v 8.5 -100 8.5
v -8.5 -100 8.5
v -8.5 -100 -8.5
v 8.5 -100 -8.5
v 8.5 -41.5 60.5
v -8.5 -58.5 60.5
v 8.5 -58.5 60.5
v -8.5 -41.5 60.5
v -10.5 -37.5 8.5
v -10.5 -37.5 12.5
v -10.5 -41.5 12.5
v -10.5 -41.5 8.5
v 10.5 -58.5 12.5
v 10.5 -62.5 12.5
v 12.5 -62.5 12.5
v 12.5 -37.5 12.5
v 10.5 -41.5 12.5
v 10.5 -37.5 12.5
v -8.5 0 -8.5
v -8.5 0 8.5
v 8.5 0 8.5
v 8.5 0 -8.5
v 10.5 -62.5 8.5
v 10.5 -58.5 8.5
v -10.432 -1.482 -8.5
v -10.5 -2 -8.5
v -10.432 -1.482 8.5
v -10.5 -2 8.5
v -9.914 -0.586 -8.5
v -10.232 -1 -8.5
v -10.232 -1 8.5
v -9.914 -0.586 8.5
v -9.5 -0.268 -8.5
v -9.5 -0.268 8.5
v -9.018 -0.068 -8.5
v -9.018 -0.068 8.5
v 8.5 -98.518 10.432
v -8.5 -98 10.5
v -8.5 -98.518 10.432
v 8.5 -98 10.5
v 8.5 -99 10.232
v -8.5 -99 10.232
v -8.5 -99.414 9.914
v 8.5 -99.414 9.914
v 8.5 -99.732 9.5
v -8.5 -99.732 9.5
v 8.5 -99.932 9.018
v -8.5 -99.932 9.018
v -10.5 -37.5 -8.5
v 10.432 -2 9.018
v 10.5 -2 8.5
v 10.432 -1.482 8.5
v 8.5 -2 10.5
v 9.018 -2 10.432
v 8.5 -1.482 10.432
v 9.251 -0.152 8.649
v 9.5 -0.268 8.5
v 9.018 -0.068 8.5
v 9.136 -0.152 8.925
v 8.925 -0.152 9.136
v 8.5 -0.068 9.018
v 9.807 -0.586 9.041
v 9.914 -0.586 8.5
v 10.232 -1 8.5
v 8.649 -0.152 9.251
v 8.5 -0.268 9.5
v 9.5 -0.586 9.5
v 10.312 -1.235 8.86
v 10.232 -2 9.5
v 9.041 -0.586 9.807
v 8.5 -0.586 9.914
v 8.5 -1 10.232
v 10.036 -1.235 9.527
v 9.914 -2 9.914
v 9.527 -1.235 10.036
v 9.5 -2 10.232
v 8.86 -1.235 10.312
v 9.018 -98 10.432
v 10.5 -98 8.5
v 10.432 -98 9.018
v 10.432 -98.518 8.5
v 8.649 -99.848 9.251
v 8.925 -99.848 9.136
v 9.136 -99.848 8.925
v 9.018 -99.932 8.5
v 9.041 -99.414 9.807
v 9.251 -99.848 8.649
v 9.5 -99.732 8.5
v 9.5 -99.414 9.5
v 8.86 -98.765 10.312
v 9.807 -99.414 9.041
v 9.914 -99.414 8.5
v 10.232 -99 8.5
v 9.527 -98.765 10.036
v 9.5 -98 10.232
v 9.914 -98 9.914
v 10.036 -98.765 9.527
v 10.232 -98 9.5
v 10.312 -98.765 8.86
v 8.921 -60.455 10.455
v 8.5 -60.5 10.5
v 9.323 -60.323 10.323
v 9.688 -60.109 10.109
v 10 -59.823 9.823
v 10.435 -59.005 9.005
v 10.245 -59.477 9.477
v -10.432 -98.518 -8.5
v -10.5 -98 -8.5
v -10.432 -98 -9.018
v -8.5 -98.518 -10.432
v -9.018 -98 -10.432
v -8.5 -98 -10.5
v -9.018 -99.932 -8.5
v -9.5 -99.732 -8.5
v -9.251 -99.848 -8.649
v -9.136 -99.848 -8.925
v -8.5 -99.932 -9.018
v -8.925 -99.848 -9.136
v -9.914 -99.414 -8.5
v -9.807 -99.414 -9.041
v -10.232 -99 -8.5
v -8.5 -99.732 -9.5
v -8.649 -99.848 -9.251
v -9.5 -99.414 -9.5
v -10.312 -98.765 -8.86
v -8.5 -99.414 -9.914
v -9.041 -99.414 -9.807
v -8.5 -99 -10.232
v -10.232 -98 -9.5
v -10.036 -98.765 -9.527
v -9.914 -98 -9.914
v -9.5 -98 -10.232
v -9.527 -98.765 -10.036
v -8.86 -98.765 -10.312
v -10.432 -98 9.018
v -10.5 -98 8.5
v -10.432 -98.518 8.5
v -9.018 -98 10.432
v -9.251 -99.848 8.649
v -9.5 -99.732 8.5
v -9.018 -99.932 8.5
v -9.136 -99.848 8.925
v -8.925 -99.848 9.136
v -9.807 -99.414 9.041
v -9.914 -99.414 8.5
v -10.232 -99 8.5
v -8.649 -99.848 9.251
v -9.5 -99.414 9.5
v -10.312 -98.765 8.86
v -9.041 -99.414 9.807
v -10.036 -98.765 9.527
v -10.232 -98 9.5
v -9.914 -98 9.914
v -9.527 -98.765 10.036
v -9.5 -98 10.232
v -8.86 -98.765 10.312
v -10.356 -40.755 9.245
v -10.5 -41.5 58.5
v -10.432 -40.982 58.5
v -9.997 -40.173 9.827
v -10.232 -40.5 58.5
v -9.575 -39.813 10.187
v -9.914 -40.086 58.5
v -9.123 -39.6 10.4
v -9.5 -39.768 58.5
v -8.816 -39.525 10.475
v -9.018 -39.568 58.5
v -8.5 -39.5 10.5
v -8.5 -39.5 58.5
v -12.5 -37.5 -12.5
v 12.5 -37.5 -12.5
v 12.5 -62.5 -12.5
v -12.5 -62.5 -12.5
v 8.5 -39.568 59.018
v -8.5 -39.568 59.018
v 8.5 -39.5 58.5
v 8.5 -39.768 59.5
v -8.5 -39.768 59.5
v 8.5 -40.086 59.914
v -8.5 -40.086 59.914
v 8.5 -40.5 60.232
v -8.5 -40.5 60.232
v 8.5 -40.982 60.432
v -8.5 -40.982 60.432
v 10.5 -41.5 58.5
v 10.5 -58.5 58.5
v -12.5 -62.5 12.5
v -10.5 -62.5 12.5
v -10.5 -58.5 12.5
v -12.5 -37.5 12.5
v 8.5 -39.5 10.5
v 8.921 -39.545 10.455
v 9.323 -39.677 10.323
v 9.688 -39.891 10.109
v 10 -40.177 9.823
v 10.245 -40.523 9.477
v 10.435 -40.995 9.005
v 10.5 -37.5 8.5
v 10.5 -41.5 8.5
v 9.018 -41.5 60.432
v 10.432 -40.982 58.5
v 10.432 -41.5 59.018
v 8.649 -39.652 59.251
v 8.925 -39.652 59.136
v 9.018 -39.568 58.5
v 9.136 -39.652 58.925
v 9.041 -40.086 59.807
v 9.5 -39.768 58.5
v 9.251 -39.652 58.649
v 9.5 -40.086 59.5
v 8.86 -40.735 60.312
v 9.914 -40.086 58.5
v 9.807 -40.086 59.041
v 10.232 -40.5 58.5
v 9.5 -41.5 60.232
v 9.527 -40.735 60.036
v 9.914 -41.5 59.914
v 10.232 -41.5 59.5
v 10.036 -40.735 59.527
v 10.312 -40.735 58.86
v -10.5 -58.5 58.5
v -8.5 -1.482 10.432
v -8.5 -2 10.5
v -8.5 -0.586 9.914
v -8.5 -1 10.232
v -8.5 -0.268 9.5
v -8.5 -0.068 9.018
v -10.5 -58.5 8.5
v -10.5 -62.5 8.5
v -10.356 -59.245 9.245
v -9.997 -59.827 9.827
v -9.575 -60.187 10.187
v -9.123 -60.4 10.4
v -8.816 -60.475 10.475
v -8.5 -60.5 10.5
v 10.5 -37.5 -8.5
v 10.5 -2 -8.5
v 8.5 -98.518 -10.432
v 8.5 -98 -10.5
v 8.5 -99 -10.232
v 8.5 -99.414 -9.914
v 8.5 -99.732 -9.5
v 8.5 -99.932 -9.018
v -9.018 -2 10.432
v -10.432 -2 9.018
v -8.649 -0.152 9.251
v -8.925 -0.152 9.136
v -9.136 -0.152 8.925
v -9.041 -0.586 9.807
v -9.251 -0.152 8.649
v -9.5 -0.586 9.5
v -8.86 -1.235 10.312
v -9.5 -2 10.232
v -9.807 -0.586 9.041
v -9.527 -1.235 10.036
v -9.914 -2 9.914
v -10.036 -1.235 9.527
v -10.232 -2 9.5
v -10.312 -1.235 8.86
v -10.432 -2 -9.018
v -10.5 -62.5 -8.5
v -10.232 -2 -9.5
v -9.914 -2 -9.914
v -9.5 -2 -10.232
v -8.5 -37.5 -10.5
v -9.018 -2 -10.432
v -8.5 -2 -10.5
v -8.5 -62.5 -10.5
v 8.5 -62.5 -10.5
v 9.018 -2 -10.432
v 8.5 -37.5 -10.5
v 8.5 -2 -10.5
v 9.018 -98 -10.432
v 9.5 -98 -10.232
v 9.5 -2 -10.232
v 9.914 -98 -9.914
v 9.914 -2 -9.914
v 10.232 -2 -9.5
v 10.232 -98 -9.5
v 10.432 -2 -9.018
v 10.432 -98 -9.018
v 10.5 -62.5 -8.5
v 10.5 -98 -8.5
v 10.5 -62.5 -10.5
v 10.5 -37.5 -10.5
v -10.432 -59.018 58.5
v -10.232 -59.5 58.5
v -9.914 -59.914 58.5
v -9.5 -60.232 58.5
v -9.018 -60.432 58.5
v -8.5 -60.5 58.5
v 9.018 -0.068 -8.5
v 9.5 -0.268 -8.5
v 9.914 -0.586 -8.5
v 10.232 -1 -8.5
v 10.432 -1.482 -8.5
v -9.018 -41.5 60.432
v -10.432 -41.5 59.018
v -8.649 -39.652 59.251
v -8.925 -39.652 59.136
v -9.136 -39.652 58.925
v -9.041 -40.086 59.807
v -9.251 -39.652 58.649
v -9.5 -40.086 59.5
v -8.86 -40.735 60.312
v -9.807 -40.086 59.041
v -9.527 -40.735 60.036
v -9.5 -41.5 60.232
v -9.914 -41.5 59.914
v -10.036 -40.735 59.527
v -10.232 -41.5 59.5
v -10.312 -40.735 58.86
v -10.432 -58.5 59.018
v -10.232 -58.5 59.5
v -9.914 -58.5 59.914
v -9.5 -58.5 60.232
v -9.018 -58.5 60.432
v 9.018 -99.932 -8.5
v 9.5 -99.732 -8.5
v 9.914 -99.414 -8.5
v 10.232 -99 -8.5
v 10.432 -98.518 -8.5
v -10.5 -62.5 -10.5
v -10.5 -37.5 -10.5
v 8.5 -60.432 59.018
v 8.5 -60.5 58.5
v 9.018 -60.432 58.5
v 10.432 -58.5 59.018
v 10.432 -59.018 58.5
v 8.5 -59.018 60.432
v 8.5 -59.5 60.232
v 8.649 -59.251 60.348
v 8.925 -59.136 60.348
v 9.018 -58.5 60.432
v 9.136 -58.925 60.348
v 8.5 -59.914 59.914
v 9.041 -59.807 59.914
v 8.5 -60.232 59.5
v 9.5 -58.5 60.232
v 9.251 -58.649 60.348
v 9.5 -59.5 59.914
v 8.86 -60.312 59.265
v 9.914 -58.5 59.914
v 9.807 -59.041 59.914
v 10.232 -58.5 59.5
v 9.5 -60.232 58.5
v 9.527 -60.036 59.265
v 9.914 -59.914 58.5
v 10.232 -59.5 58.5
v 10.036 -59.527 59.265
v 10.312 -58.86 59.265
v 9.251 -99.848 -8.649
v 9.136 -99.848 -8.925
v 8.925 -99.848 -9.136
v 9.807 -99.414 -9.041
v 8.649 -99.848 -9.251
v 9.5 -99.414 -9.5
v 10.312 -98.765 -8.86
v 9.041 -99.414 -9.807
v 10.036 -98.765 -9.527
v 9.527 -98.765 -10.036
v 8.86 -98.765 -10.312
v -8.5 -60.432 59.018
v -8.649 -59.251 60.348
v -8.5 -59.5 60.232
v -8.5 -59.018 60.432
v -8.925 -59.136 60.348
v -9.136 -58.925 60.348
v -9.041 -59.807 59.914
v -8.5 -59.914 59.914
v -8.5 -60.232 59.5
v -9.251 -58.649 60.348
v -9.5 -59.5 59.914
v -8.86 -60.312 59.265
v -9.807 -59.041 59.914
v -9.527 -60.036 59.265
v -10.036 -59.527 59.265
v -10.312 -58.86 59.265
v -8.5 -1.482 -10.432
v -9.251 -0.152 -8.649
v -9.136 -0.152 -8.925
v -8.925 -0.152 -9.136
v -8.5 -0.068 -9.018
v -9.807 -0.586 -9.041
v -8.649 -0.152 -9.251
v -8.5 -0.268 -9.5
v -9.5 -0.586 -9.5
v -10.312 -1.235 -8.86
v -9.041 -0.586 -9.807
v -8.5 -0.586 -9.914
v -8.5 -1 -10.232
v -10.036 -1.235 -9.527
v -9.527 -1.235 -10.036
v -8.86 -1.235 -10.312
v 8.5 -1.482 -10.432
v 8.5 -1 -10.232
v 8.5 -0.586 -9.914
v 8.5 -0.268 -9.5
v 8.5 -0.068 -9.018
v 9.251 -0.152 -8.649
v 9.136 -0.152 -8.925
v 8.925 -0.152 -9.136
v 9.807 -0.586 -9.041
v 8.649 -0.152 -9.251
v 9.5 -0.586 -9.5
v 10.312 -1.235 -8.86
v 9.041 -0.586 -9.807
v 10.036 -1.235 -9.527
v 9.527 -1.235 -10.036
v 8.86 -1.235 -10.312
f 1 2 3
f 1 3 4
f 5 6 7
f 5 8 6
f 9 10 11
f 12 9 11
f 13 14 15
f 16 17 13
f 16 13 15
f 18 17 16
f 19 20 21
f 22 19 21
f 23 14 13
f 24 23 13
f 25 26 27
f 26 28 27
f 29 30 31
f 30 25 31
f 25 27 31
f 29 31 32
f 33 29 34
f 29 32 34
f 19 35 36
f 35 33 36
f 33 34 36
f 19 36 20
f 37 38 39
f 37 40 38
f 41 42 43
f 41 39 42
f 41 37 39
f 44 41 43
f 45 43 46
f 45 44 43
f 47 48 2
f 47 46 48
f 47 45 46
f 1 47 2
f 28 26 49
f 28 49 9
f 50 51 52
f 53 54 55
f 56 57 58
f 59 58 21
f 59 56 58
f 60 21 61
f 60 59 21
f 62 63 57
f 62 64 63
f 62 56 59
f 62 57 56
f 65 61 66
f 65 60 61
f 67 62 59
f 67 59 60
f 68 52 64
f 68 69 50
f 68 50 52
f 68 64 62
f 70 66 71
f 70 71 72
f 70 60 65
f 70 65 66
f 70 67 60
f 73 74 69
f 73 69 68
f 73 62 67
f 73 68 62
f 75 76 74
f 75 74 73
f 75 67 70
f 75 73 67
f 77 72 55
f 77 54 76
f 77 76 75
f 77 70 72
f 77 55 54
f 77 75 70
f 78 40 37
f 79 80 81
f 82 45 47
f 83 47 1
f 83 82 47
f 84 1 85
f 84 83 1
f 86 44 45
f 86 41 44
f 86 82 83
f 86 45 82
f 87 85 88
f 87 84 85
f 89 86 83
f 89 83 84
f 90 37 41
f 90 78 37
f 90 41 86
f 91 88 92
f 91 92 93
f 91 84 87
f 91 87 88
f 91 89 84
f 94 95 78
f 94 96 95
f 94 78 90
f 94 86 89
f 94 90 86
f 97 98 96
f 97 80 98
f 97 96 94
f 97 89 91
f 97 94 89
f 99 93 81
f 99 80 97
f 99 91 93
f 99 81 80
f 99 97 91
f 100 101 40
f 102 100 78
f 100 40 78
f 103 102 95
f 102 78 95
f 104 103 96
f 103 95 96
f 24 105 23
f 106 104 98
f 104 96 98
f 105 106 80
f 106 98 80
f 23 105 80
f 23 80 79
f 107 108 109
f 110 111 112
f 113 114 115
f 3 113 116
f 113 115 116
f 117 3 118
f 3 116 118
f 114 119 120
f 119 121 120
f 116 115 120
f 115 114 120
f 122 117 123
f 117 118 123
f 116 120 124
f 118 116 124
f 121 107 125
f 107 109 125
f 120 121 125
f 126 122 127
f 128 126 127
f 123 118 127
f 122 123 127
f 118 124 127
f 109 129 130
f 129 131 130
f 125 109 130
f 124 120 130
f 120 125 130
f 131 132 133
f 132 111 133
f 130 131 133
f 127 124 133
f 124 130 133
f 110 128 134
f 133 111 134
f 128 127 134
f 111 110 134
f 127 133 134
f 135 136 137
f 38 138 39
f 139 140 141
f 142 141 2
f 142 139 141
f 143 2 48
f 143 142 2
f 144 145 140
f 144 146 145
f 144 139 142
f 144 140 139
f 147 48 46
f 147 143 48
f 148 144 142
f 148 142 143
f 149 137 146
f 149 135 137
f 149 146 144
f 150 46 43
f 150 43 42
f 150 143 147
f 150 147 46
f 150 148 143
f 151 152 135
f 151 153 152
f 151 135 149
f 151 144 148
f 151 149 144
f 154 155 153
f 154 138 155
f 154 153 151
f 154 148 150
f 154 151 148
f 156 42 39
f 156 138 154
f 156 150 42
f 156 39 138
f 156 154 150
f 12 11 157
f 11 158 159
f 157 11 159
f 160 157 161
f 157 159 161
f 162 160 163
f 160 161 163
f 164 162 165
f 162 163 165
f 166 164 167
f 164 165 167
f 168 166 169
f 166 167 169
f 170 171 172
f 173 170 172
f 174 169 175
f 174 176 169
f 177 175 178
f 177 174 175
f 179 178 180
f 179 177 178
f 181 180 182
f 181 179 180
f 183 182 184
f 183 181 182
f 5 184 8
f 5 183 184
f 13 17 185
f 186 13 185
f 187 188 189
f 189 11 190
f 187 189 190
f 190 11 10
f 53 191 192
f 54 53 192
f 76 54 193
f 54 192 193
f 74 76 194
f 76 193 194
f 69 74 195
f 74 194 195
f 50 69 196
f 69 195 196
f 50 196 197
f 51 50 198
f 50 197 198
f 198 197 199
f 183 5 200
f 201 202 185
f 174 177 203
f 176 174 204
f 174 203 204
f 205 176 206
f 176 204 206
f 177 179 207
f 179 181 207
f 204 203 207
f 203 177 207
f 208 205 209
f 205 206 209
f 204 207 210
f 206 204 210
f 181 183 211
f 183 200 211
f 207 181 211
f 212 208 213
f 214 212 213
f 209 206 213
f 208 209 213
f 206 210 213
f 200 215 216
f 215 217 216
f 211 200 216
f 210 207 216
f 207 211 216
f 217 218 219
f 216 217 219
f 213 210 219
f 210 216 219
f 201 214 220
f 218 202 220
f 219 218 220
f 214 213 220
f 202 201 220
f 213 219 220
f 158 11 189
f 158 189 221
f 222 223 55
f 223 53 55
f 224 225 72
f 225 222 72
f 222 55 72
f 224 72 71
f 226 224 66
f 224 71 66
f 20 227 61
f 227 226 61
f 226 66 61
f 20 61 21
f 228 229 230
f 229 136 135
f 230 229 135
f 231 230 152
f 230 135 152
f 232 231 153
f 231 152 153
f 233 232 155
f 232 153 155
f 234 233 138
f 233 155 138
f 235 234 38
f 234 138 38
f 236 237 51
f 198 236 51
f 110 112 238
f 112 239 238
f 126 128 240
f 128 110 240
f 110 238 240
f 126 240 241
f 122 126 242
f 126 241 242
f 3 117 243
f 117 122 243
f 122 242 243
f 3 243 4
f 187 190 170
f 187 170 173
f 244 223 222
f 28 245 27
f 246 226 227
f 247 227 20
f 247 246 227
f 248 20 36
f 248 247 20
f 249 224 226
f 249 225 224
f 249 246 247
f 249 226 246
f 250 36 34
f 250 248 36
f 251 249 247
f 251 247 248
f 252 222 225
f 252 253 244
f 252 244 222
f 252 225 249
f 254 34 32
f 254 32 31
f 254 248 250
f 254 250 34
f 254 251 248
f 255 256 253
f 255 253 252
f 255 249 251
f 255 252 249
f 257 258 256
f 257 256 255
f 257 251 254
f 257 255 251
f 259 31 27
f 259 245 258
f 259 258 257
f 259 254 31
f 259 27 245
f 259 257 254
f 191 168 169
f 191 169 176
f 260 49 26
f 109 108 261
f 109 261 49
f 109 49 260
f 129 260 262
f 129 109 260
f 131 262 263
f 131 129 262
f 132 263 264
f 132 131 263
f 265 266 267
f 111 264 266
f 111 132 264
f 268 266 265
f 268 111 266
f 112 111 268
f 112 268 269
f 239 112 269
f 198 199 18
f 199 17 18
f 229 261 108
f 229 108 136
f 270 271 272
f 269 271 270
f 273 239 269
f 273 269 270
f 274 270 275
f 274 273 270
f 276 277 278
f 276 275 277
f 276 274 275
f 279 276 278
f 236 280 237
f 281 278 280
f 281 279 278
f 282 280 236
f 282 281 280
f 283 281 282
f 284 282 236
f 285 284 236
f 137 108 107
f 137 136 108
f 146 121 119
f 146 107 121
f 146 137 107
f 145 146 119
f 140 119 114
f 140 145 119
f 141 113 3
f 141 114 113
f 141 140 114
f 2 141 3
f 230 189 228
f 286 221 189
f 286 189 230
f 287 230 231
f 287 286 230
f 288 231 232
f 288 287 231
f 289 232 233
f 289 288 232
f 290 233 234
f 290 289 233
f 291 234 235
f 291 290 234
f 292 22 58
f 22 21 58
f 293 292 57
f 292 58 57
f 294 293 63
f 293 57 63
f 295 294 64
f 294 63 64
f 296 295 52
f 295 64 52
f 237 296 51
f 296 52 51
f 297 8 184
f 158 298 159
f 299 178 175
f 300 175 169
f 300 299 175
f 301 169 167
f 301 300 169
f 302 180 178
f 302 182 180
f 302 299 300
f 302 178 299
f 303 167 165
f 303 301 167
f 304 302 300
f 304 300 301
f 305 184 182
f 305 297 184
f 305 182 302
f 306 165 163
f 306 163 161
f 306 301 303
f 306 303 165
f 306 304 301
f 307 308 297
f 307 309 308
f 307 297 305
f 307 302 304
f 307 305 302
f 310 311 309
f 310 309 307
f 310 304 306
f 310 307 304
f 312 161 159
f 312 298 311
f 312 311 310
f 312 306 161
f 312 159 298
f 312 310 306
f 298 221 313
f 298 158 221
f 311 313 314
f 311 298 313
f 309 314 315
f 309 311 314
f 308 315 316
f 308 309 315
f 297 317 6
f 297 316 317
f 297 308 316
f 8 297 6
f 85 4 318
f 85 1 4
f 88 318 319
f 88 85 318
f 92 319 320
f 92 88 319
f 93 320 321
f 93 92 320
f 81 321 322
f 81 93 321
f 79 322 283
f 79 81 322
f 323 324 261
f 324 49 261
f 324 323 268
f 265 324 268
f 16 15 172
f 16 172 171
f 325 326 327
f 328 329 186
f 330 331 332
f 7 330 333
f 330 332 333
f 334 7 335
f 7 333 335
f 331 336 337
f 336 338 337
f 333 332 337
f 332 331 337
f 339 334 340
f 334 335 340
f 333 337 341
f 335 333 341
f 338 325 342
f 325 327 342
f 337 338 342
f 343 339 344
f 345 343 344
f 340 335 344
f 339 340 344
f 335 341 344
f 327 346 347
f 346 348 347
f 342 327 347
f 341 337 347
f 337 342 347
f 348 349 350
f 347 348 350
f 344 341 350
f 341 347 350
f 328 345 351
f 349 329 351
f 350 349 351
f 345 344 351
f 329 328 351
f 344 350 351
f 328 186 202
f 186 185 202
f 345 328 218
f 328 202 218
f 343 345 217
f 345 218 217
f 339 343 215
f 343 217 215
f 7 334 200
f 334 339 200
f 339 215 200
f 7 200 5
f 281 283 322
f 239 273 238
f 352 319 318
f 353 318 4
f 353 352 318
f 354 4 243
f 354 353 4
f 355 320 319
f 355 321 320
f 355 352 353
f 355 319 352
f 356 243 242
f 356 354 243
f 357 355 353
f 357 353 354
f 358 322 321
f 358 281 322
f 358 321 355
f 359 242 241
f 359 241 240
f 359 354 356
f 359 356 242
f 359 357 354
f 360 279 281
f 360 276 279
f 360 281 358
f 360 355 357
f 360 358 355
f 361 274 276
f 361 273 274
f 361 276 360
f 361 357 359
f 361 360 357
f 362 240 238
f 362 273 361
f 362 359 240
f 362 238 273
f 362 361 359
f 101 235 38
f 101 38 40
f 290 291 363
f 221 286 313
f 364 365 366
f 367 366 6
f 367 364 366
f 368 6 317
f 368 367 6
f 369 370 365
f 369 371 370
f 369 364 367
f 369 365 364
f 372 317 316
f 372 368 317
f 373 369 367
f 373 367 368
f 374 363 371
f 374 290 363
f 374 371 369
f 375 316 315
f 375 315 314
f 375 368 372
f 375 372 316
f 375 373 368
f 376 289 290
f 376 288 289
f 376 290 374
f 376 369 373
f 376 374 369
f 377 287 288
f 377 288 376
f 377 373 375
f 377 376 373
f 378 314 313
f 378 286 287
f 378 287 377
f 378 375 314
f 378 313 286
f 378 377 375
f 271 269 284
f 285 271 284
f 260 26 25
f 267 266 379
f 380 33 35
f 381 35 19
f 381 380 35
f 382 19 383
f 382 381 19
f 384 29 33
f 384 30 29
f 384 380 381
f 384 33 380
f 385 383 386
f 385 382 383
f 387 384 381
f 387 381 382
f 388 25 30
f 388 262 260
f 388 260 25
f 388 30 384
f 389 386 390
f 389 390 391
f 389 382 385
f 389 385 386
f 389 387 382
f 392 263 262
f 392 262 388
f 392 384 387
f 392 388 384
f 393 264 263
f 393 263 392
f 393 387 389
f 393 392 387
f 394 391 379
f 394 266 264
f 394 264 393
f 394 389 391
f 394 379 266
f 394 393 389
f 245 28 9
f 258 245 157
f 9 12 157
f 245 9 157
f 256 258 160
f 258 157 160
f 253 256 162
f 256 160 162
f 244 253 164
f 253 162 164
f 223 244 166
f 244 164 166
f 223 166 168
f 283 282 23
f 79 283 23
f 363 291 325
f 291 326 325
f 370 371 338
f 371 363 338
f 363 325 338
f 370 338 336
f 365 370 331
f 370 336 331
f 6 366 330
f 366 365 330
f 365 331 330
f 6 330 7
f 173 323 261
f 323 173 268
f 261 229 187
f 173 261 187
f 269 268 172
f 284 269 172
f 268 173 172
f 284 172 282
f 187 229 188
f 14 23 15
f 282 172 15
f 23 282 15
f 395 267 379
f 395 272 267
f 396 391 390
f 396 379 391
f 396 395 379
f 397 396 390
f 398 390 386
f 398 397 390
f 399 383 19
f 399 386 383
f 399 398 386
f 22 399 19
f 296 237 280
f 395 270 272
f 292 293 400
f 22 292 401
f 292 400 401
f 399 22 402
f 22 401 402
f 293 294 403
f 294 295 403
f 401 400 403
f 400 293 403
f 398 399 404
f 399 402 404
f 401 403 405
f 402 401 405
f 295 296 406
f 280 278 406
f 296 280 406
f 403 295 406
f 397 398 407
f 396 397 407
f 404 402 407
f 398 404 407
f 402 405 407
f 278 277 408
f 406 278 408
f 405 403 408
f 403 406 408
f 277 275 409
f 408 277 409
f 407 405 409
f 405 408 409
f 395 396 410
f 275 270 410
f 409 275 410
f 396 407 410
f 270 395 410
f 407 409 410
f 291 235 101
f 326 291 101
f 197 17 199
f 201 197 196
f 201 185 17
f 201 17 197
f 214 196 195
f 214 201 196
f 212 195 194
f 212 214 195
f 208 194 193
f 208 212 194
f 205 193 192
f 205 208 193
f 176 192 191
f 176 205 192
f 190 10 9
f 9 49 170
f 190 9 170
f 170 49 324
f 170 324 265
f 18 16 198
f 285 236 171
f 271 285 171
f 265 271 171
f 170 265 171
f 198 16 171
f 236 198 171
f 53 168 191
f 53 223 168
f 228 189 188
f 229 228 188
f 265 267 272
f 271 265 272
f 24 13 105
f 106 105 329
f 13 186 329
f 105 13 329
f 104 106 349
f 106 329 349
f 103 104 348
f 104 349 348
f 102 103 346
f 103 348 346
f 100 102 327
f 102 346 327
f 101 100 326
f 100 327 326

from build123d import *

# Parameters (mm, degrees)
F0_W      = 21
F0_H      = 21
F1_DEPTH  = 100
F2_W      = 21
F2_H      = 21
F3_DEPTH  = 50
F4_R      = 2
F6_DEPTH  = 2
F7_W      = 25
F7_H      = 25
F8_DEPTH  = 2
F9_W      = 25
F9_H      = 25
F10_DEPTH = 2


with BuildPart() as f1:
    # F0 (on Front) → F1 (new body)
    with BuildSketch(Plane.XZ):
        Rectangle(F0_W, F0_H)
    extrude(amount=F1_DEPTH)

    # F2 (on face) → F3 (join)
    with BuildSketch(Plane.XY.offset(10.5)):
        with Locations((0, -50)):
            Rectangle(F2_W, F2_H)
    extrude(amount=F3_DEPTH)

    # F4
    f4_edges = [f1.edges().sort_by_distance(p)[0] for p in [
        (-10.5, -19.75, 10.5),
        (-10.5, -80.25, 10.5),
        (10.5, -80.25, 10.5),
        (10.5, -19.75, 10.5),
        (10.5, -50, -10.5),
        (-10.5, -50, -10.5),
        (-10.5, -100, 0),
        (0, -100, 10.5),
        (10.5, -100, 0),
        (0, -100, -10.5),
        (10.5, 0, 0),
        (0, 0, 10.5),
        (-10.5, 0, 0),
        (0, 0, -10.5),
        (-10.5, -60.5, 35.5),
        (10.5, -60.5, 35.5),
        (0, -60.5, 60.5),
        (10.5, -50, 60.5),
        (-10.5, -50, 60.5),
        (0, -39.5, 60.5),
        (10.5, -39.5, 35.5),
        (-10.5, -39.5, 35.5),
    ]]
    fillet(f4_edges, radius=F4_R)

    # F5 (on face) → F6 (join)
    with BuildSketch(Plane(origin=(-10.5, 0, 0), x_dir=(0, -1, 0), z_dir=(-1, 0, 0))):
        Polygon((62.5, 12.5), (37.5, 12.5), (37.5, 10.5), (37.5, -12.5), (62.5, -12.5), (62.5, 10.5), align=None)
    extrude(amount=F6_DEPTH)

    # F7 (on face) → F8 (join)
    with BuildSketch(Plane.YZ.offset(10.5)):
        with Locations((-50, 0)):
            Rectangle(F7_W, F7_H)
    extrude(amount=F8_DEPTH)

    # F9 (on face) → F10 (join)
    with BuildSketch(Plane(origin=(0, 0, -10.5), x_dir=(1, 0, 0), z_dir=(0, 0, -1))):
        with Locations((0, 50)):
            Rectangle(F9_W, F9_H)
    extrude(amount=F10_DEPTH)


solid = f1.part
